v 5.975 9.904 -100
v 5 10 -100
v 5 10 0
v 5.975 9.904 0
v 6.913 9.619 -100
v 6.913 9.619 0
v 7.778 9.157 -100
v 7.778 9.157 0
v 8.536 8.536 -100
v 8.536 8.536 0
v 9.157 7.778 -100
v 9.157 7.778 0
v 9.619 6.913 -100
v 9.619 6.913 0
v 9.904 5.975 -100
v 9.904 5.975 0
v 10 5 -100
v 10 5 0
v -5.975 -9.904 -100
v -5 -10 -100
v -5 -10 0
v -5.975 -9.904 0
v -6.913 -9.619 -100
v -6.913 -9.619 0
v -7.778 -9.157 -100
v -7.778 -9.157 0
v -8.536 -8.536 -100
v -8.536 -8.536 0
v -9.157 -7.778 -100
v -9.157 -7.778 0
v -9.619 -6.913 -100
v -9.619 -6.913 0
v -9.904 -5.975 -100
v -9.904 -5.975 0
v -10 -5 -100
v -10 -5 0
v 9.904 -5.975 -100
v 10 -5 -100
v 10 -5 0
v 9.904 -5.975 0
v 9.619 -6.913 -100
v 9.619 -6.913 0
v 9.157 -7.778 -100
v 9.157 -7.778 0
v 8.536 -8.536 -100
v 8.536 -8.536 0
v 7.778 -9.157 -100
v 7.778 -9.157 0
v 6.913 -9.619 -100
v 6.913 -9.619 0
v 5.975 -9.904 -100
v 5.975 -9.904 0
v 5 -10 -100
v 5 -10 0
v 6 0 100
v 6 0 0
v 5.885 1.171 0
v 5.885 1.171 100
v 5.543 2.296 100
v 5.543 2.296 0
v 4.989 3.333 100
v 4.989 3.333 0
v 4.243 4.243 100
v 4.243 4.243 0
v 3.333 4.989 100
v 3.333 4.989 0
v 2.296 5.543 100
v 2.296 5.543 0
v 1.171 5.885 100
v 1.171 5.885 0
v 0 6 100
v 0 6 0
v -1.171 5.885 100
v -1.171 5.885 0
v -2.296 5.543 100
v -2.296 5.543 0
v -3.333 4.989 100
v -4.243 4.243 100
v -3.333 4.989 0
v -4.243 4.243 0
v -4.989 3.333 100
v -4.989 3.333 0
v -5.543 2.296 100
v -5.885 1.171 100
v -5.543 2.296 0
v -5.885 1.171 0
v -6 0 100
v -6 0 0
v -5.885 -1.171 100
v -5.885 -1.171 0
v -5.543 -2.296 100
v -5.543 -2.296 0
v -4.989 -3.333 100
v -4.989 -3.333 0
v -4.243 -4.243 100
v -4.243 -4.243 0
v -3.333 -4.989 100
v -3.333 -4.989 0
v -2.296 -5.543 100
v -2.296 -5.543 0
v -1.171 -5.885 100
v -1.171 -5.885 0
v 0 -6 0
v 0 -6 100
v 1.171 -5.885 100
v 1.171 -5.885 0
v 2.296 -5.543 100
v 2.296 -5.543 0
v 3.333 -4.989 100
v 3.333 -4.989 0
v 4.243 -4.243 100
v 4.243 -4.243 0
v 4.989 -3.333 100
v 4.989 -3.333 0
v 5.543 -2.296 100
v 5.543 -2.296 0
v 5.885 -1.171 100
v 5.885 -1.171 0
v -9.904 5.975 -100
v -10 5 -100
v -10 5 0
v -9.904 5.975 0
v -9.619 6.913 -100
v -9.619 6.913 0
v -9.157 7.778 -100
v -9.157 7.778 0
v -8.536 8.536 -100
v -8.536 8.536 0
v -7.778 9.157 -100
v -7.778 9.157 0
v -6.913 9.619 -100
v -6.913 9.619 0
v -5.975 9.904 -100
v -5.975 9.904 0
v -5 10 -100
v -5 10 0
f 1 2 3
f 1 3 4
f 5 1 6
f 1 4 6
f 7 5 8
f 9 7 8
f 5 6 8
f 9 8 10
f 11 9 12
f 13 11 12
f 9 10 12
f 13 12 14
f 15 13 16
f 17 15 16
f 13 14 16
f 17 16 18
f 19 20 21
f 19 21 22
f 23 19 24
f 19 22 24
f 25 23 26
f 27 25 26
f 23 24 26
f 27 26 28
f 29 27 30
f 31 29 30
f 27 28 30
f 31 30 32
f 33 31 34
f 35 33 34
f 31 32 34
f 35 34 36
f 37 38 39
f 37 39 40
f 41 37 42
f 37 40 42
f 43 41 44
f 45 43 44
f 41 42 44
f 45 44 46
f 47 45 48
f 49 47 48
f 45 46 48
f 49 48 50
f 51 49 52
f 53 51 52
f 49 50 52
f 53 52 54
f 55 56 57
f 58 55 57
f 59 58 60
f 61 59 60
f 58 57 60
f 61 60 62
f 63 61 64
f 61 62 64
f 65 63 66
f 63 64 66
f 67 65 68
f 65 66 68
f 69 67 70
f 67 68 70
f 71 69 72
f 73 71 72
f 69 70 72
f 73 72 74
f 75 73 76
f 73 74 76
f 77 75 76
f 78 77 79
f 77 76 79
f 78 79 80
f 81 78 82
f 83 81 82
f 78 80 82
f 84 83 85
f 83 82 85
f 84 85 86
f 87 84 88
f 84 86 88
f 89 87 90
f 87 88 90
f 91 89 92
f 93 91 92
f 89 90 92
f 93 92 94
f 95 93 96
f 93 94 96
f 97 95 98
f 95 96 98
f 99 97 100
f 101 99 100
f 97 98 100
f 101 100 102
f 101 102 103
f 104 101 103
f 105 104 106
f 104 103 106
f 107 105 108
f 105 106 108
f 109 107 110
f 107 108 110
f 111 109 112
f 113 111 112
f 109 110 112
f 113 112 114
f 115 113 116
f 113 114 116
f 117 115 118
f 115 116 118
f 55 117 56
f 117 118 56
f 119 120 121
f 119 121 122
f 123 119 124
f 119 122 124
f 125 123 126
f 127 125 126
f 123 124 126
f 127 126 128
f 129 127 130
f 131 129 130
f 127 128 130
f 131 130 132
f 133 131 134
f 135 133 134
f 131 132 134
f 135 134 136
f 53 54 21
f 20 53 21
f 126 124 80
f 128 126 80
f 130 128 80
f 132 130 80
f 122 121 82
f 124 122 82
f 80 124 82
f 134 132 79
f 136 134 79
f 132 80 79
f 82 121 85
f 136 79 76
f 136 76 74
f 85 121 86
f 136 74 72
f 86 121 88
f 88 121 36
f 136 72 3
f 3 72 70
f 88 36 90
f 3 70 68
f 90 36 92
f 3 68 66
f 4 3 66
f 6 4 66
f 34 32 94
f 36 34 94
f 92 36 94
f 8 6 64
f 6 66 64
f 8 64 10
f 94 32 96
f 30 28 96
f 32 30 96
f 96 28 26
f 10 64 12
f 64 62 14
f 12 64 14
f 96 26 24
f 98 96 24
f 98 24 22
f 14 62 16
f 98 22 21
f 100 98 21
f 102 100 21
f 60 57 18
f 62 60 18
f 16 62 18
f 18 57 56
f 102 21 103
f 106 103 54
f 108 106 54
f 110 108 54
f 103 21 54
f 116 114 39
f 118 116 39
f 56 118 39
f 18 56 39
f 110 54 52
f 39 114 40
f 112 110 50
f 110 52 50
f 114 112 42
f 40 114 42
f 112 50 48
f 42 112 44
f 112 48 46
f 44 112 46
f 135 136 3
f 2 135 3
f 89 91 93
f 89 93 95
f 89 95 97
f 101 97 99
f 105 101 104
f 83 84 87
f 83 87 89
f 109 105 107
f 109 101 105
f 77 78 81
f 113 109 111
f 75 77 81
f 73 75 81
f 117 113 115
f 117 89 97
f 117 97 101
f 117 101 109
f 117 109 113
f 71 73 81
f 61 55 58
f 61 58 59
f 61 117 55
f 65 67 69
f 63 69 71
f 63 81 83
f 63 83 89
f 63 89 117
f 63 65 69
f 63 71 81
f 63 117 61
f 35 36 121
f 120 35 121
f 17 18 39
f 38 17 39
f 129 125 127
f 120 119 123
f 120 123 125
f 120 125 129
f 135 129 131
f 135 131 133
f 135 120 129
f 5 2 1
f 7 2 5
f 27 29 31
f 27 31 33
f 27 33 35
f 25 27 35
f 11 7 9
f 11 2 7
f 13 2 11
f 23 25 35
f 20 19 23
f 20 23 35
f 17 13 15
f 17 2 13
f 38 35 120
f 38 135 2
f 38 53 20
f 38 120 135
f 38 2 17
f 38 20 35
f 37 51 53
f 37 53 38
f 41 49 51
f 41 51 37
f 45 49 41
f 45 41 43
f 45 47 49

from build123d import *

# Parameters (mm, degrees)
F0_R     = 6
F1_DEPTH = 100
F3_DEPTH = 100


with BuildPart() as f1:
    # F0 (on Top) → F1 (new body)
    with BuildSketch(Plane.XY):
        Circle(F0_R)
    extrude(amount=F1_DEPTH)

    # F2 (on face) → F3 (join)
    with BuildSketch(Plane(origin=(0, 0, 0), x_dir=(1, 0, 0), z_dir=(0, 0, -1))):
        with BuildLine():
            ThreePointArc((0, -6), (-4.2426406871, -4.2426406871), (-6, 0))
            Line((-6, 0), (-10, 0))
            Line((-10, 0), (-10, -5))
            ThreePointArc((-10, -5), (-8.5355339059, -8.5355339059), (-5, -10))
            Line((-5, -10), (0, -10))
            Line((0, -10), (0, -6))
        make_face()
        with BuildLine():
            Line((-10, 0), (-6, 0))
            ThreePointArc((-6, 0), (-4.2426406871, 4.2426406871), (0, 6))
            Line((0, 6), (0, 10))
            Line((0, 10), (-5, 10))
            ThreePointArc((-5, 10), (-8.5355339059, 8.5355339059), (-10, 5))
            Line((-10, 5), (-10, 0))
        make_face()
        with BuildLine():
            ThreePointArc((0, 6), (-4.2426406871, 4.2426406871), (-6, 0))
            ThreePointArc((-6, 0), (-4.2426406871, -4.2426406871), (0, -6))
            ThreePointArc((0, -6), (4.2426406871, -4.2426406871), (6, 0))
            ThreePointArc((6, 0), (4.2426406871, 4.2426406871), (0, 6))
        make_face()
        with BuildLine():
            Line((0, 10), (0, 6))
            ThreePointArc((0, 6), (4.2426406871, 4.2426406871), (6, 0))
            Line((6, 0), (10, 0))
            Line((10, 0), (10, 5))
            ThreePointArc((10, 5), (8.5355339059, 8.5355339059), (5, 10))
            Line((5, 10), (0, 10))
        make_face()
        with BuildLine():
            ThreePointArc((6, 0), (4.2426406871, -4.2426406871), (0, -6))
            Line((0, -6), (0, -10))
            Line((0, -10), (5, -10))
            ThreePointArc((5, -10), (8.5355339059, -8.5355339059), (10, -5))
            Line((10, -5), (10, 0))
            Line((10, 0), (6, 0))
        make_face()
    extrude(amount=F3_DEPTH)


solid = f1.part
